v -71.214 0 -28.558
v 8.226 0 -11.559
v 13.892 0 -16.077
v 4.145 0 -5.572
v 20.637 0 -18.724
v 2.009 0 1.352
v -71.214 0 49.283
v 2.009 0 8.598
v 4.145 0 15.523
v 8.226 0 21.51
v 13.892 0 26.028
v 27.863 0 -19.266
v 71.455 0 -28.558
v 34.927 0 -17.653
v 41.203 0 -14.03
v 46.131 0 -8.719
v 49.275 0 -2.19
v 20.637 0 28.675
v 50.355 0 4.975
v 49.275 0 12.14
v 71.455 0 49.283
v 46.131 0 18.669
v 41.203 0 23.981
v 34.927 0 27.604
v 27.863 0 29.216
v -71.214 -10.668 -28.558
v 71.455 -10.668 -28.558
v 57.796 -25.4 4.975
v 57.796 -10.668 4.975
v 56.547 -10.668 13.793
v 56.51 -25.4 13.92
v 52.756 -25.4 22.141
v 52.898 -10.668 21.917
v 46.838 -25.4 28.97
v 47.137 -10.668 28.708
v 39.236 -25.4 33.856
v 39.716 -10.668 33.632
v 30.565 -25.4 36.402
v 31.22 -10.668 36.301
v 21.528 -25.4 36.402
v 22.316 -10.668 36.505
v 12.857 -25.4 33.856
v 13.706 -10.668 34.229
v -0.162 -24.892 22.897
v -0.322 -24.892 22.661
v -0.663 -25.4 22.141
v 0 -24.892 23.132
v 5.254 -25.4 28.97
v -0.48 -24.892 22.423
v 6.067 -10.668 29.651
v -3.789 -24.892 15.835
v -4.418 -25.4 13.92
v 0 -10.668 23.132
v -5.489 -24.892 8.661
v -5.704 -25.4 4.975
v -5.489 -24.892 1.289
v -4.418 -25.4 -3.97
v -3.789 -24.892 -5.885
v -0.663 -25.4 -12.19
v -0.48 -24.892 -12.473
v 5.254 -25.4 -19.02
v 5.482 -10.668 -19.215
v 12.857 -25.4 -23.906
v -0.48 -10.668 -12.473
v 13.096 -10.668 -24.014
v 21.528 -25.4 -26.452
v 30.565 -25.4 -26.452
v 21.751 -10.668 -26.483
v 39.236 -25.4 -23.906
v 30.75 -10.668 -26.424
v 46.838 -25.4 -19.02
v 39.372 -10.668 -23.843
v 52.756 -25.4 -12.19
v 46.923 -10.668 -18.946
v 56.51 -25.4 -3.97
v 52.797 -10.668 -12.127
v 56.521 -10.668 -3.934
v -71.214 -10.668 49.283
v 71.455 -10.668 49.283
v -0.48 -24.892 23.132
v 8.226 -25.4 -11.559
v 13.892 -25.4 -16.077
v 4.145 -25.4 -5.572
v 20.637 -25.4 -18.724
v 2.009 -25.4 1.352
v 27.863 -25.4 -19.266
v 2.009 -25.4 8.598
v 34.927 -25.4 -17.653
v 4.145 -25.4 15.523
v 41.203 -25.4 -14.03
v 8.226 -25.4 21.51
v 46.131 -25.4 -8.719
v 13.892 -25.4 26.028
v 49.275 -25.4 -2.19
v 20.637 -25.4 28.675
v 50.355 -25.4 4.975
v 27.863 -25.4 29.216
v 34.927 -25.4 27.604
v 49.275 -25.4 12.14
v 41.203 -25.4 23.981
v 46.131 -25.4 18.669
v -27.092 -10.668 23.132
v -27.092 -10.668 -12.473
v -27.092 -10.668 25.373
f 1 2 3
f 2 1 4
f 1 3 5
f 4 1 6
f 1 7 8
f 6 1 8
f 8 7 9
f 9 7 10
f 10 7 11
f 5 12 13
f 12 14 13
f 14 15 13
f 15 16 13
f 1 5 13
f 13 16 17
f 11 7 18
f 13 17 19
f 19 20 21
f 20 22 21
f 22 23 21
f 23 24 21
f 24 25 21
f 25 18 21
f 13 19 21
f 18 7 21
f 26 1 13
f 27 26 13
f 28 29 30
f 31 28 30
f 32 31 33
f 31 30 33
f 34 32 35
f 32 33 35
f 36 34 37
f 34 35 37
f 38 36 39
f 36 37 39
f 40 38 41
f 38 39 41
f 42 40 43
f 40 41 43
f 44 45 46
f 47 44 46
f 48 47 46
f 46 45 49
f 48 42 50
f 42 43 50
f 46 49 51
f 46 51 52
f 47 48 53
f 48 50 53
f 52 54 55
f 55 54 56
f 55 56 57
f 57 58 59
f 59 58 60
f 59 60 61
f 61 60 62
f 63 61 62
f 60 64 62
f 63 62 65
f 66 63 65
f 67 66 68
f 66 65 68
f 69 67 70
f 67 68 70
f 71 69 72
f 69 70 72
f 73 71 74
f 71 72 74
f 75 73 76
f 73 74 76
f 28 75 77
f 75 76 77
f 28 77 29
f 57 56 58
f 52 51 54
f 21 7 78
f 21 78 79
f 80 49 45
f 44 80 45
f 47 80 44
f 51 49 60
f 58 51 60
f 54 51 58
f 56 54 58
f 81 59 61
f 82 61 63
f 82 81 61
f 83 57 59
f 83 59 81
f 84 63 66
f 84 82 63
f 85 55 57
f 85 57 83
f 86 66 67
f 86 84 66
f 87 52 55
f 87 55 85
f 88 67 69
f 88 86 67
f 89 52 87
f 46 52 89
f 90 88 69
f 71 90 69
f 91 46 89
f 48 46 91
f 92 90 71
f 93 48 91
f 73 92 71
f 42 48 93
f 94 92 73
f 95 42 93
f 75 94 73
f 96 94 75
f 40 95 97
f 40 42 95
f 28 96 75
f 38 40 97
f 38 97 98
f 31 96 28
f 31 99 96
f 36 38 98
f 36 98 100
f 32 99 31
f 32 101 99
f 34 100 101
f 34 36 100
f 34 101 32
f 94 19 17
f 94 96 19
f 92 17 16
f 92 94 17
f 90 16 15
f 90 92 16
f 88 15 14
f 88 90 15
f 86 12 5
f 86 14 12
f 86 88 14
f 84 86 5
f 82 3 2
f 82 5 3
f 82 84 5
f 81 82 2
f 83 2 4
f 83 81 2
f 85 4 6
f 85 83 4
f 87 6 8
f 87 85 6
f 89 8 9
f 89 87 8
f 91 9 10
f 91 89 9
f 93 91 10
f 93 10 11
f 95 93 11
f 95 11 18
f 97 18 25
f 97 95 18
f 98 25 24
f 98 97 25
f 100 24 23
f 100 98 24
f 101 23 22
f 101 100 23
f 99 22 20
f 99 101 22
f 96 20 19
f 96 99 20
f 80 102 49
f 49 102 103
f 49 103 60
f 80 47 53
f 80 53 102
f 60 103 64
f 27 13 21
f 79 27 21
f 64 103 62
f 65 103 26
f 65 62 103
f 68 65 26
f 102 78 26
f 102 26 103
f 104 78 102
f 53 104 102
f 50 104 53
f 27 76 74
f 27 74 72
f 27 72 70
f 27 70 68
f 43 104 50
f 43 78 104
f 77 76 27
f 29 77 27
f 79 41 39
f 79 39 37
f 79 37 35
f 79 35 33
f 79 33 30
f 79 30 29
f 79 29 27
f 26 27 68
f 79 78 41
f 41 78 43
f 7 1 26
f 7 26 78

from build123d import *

# Parameters (mm, degrees)
F1_R     = 31.75
F1_R_2   = 24.309091266
F2_DEPTH = 25.4
F0_W     = 142.668440938
F0_H     = 77.8410565108
F3_DEPTH = 10.668
F5_DEPTH = 14.224
F7_DEPTH = 37.846
F8_DEPTH = 25.4


with BuildPart() as f2:
    # F1 (on Front) → F2 (new body)
    with BuildSketch(Plane.XZ):
        with Locations((26.0463114828, 4.9752164632)):
            Circle(F1_R)
        with Locations((26.0463114828, 4.9752164632)):
            Circle(F1_R_2, mode=Mode.SUBTRACT)
    extrude(amount=F2_DEPTH)

    # F0 (on Front) → F3 (join)
    with BuildSketch(Plane.XZ):
        with Locations((0.12049824, 10.3627415374)):
            Rectangle(F0_W, F0_H)
    extrude(amount=F3_DEPTH)

    # F4 (on face) → F5 (join)
    with BuildSketch(Plane.XZ.offset(10.668)):
        with BuildLine():
            ThreePointArc((-0.4795487258, -12.4730281532), (-5.7008090732, 5.4028102), (0, 23.1315420315))
            Line((0, 23.1315420315), (-27.0918570459, 23.1315420315))
            Line((-27.0918570459, 23.1315420315), (-27.0918570459, -12.4730281532))
            Line((-27.0918570459, -12.4730281532), (-0.4795487258, -12.4730281532))
        make_face()
    extrude(amount=F5_DEPTH)

    # F6 (on face) → F7 (cut)
    with BuildSketch(Plane(origin=(0, 0, -12.4730281532), x_dir=(1, 0, 0), z_dir=(0, 0, -1))):
        Polygon((-27.0918570459, 10.668), (-0.4795487258, 24.892), (-27.0918570459, 24.892), align=None)
    extrude(amount=-F7_DEPTH, mode=Mode.SUBTRACT)

    # F8 (cut): a face of the model
    f8_faces = [f2.faces().sort_by_distance(p)[0] for p in [
        (26.0463114828, -10.668, 4.9752164632),
    ]]
    extrude(f8_faces, amount=-F8_DEPTH, mode=Mode.SUBTRACT)


solid = f2.part
